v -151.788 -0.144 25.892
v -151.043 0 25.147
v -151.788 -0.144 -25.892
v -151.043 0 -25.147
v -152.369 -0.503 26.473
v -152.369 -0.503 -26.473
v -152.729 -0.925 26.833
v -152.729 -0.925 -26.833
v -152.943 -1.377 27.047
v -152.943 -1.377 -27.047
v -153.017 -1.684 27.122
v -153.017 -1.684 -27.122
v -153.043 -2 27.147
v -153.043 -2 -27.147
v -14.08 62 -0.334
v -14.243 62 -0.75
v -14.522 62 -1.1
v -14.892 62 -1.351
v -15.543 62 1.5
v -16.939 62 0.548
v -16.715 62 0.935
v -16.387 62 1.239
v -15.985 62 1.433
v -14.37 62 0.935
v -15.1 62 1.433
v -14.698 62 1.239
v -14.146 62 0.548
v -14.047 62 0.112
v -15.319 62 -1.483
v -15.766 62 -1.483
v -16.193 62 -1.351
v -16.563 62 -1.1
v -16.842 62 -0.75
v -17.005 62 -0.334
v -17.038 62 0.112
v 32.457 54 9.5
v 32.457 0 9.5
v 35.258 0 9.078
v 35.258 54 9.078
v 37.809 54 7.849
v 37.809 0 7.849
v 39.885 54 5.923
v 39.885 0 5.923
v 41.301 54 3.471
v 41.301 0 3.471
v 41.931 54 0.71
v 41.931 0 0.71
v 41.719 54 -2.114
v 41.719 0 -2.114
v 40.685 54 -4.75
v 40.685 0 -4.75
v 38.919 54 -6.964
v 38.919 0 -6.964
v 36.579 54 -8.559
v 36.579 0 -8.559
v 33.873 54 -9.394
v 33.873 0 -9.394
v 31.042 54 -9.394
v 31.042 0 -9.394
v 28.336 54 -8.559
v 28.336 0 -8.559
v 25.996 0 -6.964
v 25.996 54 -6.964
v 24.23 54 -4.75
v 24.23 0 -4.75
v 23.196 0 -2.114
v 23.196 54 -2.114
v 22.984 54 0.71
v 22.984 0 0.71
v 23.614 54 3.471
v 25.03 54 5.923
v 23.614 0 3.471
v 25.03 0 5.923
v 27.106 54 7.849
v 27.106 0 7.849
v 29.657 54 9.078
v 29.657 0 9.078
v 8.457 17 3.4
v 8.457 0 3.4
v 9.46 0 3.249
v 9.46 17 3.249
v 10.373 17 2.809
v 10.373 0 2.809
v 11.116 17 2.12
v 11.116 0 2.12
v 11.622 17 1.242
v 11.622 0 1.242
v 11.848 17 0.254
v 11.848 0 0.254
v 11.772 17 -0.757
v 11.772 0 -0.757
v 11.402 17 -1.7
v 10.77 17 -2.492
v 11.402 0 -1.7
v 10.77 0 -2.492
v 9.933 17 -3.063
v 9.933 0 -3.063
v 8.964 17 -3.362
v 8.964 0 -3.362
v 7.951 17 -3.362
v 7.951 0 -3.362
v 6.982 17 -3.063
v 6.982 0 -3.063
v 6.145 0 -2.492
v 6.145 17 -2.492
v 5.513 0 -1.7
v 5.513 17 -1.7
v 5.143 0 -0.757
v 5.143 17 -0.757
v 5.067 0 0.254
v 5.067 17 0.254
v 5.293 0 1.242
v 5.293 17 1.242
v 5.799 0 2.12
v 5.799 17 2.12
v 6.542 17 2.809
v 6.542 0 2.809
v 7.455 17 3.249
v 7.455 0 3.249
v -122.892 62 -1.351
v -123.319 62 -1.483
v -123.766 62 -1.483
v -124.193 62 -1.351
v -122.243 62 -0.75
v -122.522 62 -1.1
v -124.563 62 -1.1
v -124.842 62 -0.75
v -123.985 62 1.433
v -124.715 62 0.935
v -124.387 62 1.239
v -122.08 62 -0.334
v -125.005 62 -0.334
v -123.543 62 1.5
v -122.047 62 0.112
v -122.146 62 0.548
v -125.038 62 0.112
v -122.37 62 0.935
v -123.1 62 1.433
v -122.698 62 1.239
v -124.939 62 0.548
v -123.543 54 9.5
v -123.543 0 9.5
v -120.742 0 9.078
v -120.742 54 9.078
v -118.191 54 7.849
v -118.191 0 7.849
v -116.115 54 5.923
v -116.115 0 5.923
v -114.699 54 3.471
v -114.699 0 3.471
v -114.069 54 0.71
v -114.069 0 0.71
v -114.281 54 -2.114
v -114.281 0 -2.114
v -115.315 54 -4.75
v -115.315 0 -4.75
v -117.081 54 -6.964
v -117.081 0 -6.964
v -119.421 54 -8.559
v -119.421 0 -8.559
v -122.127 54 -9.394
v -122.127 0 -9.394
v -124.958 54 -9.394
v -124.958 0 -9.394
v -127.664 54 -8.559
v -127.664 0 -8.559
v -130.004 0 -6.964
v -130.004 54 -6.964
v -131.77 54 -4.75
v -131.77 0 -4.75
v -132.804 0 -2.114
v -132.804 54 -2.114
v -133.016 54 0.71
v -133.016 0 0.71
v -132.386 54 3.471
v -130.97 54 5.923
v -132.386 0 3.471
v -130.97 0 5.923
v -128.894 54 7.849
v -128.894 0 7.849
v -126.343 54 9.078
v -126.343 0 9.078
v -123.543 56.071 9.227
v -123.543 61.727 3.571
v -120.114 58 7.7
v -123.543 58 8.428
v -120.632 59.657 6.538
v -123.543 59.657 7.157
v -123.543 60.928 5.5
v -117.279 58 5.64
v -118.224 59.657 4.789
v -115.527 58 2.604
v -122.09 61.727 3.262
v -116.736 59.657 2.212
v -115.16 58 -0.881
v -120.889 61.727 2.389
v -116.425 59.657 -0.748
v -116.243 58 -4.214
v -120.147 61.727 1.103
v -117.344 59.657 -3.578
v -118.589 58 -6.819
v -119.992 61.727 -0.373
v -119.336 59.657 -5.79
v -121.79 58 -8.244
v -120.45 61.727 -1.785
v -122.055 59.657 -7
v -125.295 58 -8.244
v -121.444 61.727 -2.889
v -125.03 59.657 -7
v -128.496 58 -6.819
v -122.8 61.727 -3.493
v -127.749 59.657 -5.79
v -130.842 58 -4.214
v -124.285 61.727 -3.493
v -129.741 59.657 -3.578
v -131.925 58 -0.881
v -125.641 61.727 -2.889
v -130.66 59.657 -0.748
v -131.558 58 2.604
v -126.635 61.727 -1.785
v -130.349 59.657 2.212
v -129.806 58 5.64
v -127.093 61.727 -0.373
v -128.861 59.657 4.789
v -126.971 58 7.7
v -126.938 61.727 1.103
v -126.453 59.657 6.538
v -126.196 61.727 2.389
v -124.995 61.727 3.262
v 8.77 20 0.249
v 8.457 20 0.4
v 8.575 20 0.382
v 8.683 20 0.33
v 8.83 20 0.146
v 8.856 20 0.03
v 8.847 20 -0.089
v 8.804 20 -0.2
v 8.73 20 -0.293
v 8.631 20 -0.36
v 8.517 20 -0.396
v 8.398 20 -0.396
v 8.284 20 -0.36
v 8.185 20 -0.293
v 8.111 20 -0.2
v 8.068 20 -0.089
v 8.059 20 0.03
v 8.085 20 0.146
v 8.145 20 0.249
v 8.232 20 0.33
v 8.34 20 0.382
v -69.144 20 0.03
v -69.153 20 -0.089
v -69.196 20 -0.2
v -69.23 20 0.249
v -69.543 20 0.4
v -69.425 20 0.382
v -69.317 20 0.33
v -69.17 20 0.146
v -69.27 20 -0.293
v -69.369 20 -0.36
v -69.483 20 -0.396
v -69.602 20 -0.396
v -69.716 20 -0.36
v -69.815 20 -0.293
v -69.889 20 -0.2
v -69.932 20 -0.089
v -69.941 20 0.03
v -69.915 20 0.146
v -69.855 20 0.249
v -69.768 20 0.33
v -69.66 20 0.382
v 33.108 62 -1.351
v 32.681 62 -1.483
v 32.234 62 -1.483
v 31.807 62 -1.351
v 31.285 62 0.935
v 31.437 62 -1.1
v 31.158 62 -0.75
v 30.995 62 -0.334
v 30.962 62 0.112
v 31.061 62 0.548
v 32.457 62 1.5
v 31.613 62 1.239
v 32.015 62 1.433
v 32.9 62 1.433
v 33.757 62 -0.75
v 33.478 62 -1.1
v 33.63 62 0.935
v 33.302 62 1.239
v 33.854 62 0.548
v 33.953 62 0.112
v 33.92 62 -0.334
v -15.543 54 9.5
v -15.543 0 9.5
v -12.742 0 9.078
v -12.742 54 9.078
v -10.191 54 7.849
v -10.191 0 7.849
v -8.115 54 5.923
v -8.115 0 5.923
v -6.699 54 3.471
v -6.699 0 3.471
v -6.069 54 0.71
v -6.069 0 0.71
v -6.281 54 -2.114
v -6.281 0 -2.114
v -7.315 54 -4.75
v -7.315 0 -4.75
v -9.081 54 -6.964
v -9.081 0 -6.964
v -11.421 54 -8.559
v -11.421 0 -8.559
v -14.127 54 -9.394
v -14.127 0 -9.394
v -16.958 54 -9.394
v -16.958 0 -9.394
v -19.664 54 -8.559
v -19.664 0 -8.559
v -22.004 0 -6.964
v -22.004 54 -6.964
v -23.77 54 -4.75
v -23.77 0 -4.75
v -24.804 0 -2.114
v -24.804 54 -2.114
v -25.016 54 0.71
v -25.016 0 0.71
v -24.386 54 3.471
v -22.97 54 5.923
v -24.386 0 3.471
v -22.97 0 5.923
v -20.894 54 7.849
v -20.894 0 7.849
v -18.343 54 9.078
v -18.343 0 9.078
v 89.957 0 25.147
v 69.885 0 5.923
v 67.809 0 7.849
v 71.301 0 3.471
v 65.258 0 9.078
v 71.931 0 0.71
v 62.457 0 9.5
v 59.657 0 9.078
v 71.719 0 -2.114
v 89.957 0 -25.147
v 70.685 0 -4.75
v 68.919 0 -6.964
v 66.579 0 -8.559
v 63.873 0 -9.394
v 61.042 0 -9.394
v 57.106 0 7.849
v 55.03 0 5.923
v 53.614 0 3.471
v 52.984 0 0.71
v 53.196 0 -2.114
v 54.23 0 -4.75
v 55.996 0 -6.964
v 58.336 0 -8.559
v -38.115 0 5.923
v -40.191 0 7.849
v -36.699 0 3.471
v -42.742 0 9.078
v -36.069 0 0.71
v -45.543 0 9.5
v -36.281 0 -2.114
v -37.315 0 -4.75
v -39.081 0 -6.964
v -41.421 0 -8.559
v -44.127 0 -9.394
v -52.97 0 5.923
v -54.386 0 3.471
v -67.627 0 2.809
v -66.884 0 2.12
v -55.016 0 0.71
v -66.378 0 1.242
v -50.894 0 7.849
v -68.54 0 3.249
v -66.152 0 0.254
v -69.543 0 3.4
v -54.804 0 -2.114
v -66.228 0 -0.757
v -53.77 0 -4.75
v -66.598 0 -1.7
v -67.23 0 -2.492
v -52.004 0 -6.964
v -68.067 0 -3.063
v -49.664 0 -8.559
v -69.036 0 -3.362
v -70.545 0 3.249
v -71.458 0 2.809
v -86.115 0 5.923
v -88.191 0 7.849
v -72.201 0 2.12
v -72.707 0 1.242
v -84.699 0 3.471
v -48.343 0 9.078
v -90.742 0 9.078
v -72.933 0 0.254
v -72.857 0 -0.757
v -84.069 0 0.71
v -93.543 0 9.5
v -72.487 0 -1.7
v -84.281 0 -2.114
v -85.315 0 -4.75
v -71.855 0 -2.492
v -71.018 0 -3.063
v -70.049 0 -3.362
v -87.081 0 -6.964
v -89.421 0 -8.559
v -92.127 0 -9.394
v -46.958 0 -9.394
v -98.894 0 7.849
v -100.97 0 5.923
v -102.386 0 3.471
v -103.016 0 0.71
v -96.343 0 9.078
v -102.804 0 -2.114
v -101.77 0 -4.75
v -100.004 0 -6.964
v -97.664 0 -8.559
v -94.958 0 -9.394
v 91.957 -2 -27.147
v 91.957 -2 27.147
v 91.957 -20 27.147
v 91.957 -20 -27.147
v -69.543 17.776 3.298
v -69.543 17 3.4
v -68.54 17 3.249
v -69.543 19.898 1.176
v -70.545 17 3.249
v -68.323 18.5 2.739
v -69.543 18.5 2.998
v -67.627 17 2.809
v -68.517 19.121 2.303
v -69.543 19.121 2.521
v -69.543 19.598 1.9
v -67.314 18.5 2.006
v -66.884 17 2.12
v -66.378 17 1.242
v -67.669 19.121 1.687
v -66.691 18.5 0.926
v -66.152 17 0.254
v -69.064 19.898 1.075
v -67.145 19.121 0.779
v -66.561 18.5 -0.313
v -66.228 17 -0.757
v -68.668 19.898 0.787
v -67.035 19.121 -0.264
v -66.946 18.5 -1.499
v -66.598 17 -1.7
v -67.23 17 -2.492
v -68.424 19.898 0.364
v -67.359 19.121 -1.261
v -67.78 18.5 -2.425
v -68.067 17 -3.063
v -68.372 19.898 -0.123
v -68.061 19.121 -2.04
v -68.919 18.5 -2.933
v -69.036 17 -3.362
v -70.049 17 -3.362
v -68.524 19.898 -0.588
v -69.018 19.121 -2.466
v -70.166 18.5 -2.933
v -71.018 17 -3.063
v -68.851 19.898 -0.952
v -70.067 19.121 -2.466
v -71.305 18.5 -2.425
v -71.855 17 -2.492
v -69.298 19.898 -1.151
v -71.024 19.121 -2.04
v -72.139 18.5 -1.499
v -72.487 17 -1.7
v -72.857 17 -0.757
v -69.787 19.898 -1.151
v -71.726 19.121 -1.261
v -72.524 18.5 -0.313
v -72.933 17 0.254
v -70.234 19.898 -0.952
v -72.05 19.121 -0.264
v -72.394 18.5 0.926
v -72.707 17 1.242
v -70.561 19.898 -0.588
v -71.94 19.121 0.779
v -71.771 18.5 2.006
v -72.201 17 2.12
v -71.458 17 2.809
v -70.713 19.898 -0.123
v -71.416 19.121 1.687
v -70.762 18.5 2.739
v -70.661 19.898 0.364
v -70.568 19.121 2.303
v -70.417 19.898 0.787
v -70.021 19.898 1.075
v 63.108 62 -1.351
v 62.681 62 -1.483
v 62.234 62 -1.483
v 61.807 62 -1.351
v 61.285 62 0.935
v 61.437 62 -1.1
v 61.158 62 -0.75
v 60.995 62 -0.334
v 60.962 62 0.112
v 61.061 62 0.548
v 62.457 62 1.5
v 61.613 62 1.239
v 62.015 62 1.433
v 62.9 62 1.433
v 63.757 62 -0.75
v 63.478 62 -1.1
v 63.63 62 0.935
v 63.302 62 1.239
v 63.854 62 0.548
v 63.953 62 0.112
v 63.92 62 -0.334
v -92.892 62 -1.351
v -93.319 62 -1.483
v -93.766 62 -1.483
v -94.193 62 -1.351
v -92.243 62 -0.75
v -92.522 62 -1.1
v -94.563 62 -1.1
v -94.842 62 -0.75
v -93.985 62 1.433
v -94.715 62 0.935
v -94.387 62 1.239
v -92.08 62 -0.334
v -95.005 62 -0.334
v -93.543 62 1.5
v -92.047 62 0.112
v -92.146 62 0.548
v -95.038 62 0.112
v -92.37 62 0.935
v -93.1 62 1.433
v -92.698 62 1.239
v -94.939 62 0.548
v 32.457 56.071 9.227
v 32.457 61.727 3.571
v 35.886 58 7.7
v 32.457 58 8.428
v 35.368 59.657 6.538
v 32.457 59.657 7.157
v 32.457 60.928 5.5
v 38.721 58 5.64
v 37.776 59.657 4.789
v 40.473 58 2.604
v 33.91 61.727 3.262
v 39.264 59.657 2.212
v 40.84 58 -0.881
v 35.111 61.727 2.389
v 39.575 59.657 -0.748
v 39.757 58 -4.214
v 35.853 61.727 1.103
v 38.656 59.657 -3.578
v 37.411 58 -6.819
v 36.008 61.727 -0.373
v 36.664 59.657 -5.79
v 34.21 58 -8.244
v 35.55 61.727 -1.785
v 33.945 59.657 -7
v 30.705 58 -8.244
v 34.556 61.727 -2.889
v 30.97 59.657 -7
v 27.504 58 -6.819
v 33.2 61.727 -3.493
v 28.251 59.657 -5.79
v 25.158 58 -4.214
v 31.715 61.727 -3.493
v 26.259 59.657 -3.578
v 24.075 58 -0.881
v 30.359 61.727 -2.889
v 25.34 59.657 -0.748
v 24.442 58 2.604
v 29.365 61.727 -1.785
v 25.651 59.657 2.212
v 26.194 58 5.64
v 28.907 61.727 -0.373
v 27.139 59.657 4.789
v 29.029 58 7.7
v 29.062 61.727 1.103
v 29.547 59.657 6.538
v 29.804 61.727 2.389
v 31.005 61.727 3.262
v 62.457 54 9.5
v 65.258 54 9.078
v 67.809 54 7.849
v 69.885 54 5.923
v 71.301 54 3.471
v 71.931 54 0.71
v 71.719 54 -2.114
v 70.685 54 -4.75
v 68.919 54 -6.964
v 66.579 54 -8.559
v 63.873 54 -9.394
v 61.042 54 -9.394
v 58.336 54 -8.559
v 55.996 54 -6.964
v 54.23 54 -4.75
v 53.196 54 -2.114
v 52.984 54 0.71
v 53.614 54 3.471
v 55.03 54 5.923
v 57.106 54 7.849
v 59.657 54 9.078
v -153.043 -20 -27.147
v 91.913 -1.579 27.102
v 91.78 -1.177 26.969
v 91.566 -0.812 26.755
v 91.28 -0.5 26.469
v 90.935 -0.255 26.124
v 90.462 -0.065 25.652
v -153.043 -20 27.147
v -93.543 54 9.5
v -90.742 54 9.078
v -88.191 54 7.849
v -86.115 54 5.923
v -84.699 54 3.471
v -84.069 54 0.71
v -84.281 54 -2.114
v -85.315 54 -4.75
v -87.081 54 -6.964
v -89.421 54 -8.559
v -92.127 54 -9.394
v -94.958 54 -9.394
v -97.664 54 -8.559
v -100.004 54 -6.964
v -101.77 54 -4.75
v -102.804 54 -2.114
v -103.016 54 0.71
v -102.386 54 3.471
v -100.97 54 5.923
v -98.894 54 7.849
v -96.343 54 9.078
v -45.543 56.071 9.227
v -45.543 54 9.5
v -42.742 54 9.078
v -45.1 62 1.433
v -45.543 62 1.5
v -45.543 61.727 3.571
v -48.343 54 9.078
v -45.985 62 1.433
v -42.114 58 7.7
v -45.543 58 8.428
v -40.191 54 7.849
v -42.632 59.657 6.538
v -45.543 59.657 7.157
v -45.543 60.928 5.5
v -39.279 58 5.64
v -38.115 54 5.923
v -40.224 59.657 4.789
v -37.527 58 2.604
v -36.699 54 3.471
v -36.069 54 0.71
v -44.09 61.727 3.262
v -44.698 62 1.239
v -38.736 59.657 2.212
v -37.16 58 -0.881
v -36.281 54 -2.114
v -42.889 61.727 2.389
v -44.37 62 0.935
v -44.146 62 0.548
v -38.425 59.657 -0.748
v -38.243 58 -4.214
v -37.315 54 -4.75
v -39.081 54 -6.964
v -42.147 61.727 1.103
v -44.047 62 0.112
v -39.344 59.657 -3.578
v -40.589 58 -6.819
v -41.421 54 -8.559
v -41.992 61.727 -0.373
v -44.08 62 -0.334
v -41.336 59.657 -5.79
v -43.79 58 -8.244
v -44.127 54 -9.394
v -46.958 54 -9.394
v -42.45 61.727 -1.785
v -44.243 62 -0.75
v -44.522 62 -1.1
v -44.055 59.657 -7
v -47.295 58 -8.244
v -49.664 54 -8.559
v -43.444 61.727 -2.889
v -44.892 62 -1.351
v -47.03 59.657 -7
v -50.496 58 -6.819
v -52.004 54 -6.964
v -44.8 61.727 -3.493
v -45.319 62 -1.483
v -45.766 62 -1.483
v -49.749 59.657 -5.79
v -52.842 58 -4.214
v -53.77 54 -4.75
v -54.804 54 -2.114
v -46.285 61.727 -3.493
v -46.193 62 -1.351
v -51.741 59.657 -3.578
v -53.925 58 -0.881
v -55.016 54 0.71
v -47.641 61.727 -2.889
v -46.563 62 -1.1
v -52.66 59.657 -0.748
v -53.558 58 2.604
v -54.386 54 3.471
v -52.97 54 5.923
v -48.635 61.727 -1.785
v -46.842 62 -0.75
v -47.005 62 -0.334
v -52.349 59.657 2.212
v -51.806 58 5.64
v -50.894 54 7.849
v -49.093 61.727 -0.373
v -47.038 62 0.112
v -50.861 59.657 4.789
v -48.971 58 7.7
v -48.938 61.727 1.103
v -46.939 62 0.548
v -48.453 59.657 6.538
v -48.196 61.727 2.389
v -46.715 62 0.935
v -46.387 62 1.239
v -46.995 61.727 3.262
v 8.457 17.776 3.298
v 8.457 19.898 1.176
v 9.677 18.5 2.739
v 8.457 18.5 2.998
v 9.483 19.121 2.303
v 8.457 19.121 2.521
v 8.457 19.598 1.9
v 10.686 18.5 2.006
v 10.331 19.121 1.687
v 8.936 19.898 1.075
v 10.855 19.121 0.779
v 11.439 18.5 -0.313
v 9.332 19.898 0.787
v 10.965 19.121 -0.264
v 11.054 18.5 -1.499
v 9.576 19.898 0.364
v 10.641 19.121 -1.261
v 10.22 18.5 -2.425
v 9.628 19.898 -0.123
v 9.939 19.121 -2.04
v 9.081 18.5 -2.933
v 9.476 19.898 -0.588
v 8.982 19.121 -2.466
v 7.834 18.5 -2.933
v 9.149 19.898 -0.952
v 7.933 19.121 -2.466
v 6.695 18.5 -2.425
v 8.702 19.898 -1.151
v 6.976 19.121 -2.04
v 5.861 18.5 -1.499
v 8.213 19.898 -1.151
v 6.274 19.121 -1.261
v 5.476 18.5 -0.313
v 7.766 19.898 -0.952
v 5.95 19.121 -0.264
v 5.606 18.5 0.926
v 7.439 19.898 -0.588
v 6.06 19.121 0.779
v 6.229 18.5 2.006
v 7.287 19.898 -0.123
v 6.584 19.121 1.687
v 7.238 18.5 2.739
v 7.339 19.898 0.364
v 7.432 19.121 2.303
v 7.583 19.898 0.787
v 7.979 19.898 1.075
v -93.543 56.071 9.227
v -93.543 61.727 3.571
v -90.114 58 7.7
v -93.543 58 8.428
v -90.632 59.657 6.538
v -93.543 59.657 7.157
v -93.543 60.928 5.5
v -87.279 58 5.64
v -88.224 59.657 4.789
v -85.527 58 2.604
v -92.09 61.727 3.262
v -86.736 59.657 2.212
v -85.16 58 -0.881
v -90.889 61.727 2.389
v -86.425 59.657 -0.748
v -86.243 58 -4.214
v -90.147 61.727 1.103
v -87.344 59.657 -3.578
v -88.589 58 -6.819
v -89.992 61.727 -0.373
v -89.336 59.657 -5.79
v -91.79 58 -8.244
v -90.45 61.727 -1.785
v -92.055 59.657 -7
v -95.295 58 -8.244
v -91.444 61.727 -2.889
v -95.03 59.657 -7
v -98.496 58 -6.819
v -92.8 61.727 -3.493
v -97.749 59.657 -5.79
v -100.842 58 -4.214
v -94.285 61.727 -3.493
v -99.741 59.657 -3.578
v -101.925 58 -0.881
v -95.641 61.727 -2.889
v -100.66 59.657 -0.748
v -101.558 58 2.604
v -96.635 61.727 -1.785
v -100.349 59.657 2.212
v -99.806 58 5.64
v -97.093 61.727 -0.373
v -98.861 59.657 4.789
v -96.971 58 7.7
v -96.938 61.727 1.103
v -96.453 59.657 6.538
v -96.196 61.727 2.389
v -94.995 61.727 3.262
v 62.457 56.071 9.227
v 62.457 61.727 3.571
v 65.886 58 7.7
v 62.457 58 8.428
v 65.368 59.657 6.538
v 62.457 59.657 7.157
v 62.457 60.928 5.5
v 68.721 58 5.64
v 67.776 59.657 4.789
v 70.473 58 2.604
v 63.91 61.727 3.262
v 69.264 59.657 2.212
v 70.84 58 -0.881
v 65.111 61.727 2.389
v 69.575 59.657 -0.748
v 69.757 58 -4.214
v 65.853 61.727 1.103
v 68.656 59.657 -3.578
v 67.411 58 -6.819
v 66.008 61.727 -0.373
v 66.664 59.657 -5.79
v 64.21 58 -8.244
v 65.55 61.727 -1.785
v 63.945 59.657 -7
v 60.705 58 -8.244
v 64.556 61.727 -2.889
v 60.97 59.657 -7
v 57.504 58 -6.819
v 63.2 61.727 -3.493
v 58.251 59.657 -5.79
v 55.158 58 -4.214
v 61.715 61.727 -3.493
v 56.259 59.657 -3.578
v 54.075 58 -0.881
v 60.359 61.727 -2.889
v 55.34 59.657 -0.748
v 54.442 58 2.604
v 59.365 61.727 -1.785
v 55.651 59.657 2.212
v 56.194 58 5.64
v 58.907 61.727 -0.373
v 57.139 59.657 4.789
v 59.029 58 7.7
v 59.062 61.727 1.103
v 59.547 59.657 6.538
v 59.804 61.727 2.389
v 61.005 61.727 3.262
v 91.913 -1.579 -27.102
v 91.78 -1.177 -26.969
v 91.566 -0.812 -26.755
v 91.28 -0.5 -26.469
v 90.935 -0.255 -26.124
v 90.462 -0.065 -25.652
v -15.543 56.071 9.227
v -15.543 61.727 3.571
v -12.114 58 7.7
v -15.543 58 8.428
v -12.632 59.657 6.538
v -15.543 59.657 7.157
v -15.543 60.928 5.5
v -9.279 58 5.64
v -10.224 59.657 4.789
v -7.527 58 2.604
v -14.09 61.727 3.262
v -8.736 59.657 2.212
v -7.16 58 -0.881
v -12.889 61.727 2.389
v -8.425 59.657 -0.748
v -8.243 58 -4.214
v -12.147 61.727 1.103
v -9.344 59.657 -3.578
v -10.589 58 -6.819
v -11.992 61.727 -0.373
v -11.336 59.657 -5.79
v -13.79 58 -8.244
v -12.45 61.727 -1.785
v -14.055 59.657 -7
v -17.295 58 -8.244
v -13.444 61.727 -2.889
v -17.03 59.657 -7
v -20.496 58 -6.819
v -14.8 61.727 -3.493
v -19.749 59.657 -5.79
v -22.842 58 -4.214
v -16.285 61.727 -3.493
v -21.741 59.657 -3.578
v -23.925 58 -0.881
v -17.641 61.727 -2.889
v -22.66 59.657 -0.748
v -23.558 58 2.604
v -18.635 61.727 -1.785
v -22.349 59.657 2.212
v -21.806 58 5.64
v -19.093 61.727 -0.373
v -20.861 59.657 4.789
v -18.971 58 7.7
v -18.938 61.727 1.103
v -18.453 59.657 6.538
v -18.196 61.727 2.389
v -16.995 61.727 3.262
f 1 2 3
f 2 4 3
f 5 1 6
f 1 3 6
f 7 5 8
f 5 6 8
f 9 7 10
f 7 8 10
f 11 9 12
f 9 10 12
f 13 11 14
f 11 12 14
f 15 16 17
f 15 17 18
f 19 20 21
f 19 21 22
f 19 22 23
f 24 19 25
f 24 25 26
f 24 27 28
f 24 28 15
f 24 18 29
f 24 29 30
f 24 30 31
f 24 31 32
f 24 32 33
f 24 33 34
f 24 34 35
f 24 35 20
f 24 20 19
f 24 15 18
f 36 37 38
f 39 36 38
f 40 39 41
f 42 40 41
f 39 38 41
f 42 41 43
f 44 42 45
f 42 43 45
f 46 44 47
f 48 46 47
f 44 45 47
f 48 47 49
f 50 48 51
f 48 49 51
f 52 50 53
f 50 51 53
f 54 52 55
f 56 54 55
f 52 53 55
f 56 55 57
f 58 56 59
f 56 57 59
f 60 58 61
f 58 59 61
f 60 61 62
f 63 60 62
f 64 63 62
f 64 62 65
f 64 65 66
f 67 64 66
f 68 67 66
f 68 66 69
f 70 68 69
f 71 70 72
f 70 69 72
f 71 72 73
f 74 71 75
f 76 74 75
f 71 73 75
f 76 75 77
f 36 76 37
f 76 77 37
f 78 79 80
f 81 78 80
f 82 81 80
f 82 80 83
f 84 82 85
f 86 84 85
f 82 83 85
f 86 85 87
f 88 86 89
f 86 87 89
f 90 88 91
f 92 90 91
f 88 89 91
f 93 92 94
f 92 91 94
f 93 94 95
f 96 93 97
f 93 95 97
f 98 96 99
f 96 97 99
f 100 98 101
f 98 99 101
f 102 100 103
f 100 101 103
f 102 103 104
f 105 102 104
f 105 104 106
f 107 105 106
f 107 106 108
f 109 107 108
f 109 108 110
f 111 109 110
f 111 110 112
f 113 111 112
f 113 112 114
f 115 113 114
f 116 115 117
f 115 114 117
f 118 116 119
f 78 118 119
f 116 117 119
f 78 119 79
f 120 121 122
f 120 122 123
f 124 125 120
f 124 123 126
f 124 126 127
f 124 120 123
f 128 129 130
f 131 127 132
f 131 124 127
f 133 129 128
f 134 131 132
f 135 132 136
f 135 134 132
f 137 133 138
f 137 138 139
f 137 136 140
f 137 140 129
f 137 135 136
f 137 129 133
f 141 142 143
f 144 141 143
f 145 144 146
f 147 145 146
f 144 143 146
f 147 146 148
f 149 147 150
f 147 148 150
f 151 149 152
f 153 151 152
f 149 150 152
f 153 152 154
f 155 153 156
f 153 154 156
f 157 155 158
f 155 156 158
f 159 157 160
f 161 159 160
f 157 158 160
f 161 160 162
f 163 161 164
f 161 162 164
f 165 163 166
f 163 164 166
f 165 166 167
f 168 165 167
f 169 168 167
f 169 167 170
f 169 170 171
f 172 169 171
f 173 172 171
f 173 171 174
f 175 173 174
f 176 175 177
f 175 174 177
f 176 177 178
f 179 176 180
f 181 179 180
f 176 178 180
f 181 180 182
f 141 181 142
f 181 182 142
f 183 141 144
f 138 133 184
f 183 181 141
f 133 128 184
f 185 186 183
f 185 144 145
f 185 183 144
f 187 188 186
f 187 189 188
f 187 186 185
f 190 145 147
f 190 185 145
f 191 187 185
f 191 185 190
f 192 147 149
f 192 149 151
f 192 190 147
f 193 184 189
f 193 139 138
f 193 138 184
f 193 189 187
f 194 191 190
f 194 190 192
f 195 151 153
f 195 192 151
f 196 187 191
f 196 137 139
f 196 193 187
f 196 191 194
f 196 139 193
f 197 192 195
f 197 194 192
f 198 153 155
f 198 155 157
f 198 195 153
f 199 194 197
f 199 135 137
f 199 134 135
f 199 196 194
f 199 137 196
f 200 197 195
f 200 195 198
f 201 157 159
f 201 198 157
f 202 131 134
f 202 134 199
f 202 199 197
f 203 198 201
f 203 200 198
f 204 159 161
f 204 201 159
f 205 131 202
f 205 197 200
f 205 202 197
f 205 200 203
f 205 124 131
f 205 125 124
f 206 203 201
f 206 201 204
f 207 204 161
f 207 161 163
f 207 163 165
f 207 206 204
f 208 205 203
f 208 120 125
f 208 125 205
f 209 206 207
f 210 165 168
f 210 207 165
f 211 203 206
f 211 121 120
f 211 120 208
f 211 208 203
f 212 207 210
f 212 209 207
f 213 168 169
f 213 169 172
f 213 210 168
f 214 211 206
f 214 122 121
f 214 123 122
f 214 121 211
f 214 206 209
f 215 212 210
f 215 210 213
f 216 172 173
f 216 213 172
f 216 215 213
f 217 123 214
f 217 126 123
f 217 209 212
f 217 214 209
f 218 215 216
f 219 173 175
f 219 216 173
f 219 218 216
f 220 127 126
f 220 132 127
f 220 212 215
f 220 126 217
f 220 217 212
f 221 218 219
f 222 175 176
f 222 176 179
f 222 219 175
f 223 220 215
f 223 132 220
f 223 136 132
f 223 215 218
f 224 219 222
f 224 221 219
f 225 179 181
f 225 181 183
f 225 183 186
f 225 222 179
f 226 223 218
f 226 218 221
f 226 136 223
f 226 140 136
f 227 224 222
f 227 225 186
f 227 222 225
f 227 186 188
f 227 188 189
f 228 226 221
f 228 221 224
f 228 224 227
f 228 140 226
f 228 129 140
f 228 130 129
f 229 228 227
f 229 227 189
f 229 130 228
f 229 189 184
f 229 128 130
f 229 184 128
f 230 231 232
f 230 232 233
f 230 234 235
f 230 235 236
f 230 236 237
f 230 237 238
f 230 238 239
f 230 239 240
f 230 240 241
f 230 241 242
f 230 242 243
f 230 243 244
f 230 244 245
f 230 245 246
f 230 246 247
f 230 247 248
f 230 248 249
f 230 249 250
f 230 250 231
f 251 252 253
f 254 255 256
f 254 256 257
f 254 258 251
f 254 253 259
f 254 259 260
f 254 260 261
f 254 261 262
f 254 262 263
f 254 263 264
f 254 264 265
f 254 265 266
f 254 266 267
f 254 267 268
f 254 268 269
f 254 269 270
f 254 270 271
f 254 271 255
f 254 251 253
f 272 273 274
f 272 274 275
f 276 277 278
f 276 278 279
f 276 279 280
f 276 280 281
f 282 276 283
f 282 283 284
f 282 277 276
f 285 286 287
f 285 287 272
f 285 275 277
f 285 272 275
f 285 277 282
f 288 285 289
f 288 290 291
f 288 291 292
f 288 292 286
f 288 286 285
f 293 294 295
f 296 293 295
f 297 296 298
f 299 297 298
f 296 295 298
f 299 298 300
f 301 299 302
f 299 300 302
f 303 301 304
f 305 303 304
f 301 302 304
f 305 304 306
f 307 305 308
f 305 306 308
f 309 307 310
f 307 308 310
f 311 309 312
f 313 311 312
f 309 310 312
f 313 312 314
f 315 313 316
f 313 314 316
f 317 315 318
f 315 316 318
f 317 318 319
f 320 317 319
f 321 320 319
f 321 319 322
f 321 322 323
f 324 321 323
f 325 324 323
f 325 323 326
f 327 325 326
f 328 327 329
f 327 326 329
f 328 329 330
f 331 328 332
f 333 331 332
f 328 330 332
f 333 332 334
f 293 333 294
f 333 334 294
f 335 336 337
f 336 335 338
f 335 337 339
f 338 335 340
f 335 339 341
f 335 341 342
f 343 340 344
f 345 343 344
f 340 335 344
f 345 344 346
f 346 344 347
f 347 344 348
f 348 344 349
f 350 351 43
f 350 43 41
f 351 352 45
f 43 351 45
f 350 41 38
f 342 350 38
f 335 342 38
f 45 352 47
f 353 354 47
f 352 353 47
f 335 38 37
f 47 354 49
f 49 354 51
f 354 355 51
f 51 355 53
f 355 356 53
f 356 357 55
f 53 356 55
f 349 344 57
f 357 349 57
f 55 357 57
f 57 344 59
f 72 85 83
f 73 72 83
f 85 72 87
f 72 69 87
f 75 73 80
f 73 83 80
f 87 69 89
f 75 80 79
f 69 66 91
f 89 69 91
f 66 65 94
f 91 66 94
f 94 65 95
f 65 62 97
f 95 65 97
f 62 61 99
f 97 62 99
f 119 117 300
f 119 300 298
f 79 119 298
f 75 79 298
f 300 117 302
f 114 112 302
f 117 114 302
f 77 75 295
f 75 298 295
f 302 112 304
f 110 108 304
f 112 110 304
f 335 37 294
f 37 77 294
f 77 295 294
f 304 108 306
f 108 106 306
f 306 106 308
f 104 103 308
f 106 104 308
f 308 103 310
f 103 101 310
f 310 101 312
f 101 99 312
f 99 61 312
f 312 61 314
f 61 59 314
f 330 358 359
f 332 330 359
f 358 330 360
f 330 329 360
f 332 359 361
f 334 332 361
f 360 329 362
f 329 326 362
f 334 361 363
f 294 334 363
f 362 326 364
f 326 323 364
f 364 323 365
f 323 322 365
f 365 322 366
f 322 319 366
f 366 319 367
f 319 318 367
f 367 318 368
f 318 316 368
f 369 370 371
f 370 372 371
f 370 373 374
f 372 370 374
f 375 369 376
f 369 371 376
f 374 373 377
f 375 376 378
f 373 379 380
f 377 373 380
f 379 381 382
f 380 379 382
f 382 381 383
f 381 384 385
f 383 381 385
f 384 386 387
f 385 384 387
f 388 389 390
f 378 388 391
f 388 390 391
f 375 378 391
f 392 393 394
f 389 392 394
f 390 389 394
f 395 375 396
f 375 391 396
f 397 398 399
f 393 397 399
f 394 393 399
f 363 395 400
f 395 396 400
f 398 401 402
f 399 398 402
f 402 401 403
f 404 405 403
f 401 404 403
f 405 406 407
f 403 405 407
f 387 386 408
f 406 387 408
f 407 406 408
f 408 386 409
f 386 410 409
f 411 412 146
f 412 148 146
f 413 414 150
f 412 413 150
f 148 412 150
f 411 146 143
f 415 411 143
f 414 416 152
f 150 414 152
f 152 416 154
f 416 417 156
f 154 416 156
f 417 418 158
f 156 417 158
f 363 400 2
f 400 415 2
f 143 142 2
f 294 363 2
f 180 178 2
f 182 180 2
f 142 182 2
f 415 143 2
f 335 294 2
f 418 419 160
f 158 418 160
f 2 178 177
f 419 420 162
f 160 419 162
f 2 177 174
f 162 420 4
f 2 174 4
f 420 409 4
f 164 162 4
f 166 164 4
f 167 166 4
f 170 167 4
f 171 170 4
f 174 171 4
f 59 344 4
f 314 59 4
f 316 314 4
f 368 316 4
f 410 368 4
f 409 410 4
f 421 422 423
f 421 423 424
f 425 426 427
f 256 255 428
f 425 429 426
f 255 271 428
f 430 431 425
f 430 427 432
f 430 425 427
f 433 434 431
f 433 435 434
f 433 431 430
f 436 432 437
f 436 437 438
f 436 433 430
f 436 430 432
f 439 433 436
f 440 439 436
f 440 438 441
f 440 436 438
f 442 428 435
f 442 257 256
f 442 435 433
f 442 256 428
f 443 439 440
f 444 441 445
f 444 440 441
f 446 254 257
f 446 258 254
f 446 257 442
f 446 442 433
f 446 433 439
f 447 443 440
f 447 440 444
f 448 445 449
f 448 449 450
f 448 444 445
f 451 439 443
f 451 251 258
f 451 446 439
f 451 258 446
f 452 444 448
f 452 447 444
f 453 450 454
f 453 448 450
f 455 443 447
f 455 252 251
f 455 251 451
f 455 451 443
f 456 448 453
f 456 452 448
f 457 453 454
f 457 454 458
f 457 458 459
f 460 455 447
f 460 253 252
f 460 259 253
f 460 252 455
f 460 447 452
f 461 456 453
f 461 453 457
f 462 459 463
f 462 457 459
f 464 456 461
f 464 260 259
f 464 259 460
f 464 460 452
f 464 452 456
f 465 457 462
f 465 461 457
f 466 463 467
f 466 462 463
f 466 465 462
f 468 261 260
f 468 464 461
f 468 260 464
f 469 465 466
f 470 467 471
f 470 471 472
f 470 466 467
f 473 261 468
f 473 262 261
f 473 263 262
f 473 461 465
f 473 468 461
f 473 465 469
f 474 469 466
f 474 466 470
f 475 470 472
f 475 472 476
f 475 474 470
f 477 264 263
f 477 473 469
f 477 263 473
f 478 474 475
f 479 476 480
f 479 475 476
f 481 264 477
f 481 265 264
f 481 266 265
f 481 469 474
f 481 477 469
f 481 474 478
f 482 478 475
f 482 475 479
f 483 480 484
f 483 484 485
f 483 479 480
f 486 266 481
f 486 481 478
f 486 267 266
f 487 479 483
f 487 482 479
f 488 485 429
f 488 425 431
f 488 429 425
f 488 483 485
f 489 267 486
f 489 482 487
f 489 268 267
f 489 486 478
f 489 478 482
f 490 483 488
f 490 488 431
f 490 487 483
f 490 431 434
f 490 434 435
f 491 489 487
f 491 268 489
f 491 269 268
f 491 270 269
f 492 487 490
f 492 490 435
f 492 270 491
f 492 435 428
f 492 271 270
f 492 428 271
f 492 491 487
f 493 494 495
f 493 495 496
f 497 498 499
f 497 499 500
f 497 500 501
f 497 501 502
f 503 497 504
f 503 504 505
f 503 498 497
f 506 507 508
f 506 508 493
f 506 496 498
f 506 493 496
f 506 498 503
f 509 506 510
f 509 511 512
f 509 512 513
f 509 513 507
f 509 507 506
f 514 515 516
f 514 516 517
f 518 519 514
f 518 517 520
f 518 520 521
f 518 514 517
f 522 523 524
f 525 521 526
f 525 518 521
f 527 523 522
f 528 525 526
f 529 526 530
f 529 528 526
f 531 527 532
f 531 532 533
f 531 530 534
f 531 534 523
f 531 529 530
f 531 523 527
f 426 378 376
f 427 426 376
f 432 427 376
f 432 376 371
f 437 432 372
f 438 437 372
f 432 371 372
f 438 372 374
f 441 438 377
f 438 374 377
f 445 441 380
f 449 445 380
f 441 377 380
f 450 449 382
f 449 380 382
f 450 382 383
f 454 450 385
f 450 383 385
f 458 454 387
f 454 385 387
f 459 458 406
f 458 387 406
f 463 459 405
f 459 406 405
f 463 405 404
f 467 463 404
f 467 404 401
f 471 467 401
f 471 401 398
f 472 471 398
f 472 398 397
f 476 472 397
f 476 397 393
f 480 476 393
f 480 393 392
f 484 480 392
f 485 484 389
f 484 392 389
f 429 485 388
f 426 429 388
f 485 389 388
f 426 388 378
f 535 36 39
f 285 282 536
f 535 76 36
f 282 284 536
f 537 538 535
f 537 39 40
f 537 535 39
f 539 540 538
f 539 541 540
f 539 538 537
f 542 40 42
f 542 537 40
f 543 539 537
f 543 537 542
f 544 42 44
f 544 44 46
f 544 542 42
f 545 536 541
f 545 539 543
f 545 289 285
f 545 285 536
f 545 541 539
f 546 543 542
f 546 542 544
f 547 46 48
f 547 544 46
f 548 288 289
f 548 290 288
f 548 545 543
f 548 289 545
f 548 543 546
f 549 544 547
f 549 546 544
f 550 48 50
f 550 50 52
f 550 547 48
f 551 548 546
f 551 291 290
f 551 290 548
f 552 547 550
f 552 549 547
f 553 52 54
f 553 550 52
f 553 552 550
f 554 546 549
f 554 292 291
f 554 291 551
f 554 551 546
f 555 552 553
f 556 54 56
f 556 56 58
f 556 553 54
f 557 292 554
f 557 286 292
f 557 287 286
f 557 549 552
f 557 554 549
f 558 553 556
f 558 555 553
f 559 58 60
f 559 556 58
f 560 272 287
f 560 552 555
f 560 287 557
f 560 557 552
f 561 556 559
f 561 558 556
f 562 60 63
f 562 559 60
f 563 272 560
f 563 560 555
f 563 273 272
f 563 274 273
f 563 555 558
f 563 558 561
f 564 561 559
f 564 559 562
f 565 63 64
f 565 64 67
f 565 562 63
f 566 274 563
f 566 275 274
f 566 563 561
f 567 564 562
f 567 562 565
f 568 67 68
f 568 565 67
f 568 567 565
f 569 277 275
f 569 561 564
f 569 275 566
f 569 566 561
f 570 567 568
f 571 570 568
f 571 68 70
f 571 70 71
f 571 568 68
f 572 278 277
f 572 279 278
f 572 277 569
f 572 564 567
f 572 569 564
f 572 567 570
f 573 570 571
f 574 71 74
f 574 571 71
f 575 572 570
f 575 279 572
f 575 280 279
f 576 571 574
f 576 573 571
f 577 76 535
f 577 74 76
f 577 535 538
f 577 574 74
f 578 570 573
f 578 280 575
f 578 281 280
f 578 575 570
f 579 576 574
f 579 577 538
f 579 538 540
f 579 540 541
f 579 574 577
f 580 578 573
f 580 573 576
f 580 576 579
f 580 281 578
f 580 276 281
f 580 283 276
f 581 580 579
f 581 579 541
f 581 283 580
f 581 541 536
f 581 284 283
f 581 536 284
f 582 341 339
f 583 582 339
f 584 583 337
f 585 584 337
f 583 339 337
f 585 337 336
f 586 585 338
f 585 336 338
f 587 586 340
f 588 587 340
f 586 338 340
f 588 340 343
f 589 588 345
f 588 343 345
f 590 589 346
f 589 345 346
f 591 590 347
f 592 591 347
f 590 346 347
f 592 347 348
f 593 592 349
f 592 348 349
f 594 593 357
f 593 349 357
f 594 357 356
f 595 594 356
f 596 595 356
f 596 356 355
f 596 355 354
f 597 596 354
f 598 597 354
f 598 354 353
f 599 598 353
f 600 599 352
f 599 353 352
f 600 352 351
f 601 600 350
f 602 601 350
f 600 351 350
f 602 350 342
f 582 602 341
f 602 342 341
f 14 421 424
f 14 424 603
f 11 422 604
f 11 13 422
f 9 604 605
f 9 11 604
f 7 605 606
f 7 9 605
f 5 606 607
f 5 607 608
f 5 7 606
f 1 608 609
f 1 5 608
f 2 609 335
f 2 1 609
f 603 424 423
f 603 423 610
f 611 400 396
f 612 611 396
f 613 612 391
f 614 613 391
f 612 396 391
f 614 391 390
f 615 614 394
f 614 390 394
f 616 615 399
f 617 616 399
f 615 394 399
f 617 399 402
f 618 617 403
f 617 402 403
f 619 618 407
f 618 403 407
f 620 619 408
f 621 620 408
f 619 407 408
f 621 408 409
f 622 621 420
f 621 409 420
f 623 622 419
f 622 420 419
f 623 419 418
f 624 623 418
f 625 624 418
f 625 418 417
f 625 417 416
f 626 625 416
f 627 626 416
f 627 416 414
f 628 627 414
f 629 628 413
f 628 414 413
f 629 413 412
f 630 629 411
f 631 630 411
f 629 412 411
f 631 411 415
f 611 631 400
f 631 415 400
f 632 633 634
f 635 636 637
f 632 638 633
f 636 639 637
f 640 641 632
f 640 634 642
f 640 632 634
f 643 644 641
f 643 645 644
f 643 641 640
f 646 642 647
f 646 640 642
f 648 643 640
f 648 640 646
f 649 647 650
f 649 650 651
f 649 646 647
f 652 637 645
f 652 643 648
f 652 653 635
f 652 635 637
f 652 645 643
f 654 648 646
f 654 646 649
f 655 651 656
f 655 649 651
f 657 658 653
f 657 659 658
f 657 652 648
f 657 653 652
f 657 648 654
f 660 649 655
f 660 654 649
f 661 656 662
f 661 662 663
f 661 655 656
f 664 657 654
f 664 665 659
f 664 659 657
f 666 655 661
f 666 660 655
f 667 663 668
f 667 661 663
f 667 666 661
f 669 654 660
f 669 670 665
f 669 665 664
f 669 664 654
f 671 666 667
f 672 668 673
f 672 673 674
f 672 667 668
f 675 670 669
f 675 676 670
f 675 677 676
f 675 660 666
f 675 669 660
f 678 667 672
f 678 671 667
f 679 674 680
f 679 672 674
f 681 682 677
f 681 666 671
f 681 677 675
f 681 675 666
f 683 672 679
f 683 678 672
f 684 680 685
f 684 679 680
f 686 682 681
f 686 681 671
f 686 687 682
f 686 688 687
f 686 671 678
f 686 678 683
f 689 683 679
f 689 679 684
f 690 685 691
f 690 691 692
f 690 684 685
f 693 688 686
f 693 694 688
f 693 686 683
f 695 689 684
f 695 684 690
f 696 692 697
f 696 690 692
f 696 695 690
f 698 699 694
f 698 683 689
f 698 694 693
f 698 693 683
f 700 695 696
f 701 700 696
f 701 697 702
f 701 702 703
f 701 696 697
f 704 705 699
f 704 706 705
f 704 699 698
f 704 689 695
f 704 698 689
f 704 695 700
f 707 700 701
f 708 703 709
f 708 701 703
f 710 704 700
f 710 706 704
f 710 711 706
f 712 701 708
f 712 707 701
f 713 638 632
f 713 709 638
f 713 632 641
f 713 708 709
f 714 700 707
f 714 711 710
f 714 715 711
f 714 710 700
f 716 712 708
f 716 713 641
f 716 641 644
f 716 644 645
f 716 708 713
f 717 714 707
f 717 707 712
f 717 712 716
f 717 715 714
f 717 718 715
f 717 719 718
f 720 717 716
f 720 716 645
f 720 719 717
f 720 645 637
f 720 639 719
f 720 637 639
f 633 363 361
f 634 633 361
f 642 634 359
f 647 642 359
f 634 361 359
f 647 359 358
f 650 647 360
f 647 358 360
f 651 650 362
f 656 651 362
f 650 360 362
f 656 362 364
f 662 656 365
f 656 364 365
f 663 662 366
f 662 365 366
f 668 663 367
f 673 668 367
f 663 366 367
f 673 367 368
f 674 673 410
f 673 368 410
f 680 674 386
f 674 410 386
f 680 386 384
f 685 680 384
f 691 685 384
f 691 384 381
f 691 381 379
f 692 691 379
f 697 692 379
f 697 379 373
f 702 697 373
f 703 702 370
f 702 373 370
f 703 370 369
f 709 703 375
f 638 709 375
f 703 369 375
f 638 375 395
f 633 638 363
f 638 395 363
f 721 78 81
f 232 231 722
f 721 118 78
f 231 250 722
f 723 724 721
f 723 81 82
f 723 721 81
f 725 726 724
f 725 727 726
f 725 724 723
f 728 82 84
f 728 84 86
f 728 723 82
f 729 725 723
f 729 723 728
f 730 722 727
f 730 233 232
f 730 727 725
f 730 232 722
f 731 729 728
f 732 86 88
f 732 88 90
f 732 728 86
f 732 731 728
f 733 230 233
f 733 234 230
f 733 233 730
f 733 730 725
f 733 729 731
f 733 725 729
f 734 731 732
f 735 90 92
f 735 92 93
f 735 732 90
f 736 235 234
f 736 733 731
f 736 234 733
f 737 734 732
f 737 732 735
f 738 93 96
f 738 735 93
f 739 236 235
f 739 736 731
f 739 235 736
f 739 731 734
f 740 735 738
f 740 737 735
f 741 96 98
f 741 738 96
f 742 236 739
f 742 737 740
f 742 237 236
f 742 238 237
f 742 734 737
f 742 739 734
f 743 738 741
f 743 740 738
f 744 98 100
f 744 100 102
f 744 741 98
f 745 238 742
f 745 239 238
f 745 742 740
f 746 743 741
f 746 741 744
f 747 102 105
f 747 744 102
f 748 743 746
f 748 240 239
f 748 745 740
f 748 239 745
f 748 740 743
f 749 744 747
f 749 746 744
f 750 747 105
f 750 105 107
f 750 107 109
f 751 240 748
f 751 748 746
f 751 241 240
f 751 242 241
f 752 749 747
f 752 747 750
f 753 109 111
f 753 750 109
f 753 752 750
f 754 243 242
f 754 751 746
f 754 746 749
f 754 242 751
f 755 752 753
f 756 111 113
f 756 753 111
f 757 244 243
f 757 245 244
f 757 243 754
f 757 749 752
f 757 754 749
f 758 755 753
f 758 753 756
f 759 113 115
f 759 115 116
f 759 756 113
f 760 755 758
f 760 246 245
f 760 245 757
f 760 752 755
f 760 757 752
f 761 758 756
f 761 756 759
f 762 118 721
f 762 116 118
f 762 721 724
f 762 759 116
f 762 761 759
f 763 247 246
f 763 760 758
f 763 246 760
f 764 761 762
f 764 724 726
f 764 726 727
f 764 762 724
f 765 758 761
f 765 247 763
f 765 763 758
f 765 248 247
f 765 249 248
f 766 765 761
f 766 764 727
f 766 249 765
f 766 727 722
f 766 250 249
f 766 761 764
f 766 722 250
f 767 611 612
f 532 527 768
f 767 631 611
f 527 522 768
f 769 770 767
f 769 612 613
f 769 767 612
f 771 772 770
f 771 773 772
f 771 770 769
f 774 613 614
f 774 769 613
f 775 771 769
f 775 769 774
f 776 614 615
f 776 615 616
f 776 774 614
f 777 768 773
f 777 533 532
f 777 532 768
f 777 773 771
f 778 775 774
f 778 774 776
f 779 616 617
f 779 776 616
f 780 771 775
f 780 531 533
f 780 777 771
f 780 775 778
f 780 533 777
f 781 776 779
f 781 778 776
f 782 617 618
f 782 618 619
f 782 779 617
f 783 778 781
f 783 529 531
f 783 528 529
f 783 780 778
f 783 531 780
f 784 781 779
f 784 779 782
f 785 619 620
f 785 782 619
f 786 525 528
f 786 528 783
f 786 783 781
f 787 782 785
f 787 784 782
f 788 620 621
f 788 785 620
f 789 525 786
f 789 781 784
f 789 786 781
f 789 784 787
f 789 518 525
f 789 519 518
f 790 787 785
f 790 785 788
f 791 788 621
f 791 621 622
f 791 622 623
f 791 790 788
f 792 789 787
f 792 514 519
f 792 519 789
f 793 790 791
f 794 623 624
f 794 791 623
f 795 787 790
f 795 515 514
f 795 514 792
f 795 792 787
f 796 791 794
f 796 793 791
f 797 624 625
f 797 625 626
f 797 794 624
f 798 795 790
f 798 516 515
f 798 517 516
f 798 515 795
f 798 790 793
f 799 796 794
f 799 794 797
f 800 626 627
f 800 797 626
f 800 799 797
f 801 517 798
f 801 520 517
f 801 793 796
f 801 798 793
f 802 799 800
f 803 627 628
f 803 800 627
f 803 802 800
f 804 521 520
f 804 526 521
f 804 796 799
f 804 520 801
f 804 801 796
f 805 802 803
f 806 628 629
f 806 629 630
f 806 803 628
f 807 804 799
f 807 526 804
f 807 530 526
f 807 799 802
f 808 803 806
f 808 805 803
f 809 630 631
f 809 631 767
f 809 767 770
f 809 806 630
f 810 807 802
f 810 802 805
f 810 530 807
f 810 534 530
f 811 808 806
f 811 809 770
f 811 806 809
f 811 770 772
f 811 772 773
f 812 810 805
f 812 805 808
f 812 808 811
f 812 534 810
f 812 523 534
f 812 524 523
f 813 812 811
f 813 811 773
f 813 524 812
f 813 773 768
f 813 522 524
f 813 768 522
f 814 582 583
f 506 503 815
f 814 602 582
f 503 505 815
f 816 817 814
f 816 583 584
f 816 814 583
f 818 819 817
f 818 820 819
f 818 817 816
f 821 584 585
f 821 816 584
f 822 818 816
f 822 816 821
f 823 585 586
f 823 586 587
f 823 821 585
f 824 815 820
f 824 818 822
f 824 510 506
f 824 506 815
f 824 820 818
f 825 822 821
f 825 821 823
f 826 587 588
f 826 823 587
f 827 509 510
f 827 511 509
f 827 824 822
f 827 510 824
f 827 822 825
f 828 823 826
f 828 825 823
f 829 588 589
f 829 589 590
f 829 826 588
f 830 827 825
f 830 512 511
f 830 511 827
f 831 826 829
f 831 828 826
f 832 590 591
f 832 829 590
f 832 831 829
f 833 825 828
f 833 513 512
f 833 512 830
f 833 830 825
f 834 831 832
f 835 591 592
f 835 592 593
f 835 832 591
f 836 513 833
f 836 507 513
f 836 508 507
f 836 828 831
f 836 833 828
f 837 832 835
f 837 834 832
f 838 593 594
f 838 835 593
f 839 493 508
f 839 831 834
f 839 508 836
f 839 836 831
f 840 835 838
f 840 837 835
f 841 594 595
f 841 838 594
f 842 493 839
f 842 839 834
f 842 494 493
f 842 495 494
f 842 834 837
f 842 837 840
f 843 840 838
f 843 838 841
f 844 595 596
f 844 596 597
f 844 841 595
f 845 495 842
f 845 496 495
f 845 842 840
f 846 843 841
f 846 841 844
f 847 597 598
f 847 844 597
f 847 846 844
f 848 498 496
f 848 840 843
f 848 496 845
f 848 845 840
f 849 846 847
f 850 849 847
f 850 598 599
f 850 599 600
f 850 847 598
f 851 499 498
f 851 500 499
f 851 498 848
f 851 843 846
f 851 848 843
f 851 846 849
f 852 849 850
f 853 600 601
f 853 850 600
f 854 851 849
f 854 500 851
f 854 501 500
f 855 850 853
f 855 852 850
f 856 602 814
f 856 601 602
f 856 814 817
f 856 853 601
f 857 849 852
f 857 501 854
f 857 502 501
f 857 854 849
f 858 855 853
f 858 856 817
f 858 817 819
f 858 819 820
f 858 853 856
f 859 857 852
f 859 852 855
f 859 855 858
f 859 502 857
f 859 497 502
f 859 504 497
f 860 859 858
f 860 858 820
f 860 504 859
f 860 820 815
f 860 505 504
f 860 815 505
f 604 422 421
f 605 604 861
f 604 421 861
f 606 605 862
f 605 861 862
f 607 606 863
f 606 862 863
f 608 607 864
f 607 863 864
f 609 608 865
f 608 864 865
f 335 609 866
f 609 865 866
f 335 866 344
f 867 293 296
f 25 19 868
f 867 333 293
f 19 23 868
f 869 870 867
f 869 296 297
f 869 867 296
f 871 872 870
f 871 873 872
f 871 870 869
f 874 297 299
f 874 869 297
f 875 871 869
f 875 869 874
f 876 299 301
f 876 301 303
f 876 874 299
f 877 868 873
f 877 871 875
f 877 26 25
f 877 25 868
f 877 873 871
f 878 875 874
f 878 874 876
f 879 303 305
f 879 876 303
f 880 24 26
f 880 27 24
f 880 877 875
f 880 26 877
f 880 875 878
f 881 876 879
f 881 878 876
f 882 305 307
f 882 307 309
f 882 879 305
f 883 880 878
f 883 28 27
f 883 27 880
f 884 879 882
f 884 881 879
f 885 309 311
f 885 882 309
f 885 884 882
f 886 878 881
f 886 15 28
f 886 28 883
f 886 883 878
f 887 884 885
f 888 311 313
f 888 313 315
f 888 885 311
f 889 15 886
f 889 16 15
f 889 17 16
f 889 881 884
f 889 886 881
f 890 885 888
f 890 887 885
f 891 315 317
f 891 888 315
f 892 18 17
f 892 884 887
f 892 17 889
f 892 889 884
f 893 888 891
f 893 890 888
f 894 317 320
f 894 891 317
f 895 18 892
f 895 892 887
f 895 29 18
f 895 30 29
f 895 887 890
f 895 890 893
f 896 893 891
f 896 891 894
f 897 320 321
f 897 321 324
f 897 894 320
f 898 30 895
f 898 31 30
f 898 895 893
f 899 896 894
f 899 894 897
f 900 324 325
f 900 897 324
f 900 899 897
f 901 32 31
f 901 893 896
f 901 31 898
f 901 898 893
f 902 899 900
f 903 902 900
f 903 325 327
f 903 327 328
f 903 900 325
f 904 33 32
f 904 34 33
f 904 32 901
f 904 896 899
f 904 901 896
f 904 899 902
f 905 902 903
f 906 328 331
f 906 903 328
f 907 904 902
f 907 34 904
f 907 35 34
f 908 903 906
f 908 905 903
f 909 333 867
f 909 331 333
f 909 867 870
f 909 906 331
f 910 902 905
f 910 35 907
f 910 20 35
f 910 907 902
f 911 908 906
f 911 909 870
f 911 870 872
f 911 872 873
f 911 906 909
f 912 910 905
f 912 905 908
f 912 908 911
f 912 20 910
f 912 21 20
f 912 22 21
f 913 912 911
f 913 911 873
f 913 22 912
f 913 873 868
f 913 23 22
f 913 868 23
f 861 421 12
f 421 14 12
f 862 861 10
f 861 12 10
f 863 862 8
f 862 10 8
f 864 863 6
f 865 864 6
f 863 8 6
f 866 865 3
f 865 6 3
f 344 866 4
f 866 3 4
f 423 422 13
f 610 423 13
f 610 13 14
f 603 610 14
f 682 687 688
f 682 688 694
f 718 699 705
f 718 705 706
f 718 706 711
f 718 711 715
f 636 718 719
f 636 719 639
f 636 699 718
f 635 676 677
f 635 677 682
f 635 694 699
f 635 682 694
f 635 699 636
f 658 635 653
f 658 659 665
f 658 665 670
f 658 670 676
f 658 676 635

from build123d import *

# Parameters (mm, degrees)
ESQUISSE2_R          = 9.5
BOSS_EXTRU_1_DEPTH   = 62
BOSS_EXTRU_1_2_DEPTH = 62
BOSS_EXTRU_1_3_DEPTH = 62
BOSS_EXTRU_1_4_DEPTH = 62
BOSS_EXTRU_1_5_DEPTH = 62
BOSS_EXTRU_1_6_DEPTH = 62
ESQUISSE2_4_R        = 9.5
ESQUISSE2_4_R_2      = 3.4
BOSS_EXTRU_2_DEPTH   = 20
CONG_3_R             = 8
CONG_4_R             = 8
CONG_5_R             = 8
CONG_6_R             = 8
CONG_7_R             = 8
CONG_8_R             = 8
CONG_10_R            = 3
CONG_11_R            = 3
ESQUISSE4_W          = 245
ESQUISSE4_H          = 54.293120758
BOSS_EXTRU_3_DEPTH   = 20
CONG_12_R            = 2


with BuildPart() as part:
    # Esquisse2 → Boss.-Extru.1 (new body)
    with BuildSketch(Plane(origin=(0, 0, 0), x_dir=(1, 0, 0), z_dir=(0, 1, 0))):
        with Locations((32.457497884, 0)):
            Circle(ESQUISSE2_R)
    extrude(amount=BOSS_EXTRU_1_DEPTH)



with BuildPart() as body_2:
    # Esquisse2 → Boss.-Extru.1 2 (new body)
    with BuildSketch(Plane(origin=(0, 0, 0), x_dir=(1, 0, 0), z_dir=(0, 1, 0))):
        with Locations((62.457497884, 0)):
            Circle(ESQUISSE2_R)
    extrude(amount=BOSS_EXTRU_1_2_DEPTH)


with BuildPart() as body_3:
    # Esquisse2 → Boss.-Extru.1 3 (new body)
    with BuildSketch(Plane(origin=(0, 0, 0), x_dir=(1, 0, 0), z_dir=(0, 1, 0))):
        with Locations((-123.542502116, 0)):
            Circle(ESQUISSE2_R)
    extrude(amount=BOSS_EXTRU_1_3_DEPTH)


with BuildPart() as body_4:
    # Esquisse2 → Boss.-Extru.1 4 (new body)
    with BuildSketch(Plane(origin=(0, 0, 0), x_dir=(1, 0, 0), z_dir=(0, 1, 0))):
        with Locations((-93.542502116, 0)):
            Circle(ESQUISSE2_R)
    extrude(amount=BOSS_EXTRU_1_4_DEPTH)


with BuildPart() as body_5:
    # Esquisse2 → Boss.-Extru.1 5 (new body)
    with BuildSketch(Plane(origin=(0, 0, 0), x_dir=(1, 0, 0), z_dir=(0, 1, 0))):
        with Locations((-45.542502116, 0)):
            Circle(ESQUISSE2_R)
    extrude(amount=BOSS_EXTRU_1_5_DEPTH)


with BuildPart() as body_6:
    # Esquisse2 → Boss.-Extru.1 6 (new body)
    with BuildSketch(Plane(origin=(0, 0, 0), x_dir=(1, 0, 0), z_dir=(0, 1, 0))):
        with Locations((-15.542502116, 0)):
            Circle(ESQUISSE2_R)
    extrude(amount=BOSS_EXTRU_1_6_DEPTH)


with BuildPart() as part_1:
    add(part.part)

    add(body_2.part)  # Boss.-Extru.2 merges body 2

    add(body_3.part)  # Boss.-Extru.2 merges body 3

    add(body_4.part)  # Boss.-Extru.2 merges body 4

    add(body_5.part)  # Boss.-Extru.2 merges body 5

    add(body_6.part)  # Boss.-Extru.2 merges body 6
    # Esquisse2<4> → Boss.-Extru.2 (add)
    with BuildSketch(Plane(origin=(0, 0, 0), x_dir=(1, 0, 0), z_dir=(0, 1, 0))):
        with Locations((32.457497884, 0)):
            Circle(ESQUISSE2_4_R)
        with Locations((62.457497884, 0)):
            Circle(ESQUISSE2_4_R)
        with Locations((-123.542502116, 0)):
            Circle(ESQUISSE2_4_R)
        with Locations((-93.542502116, 0)):
            Circle(ESQUISSE2_4_R)
        with Locations((-45.542502116, 0)):
            Circle(ESQUISSE2_4_R)
        with Locations((-15.542502116, 0)):
            Circle(ESQUISSE2_4_R)
        with Locations((-69.542502116, 0)):
            Circle(ESQUISSE2_4_R_2)
        with Locations((8.457497884, 0)):
            Circle(ESQUISSE2_4_R_2)
    extrude(amount=BOSS_EXTRU_2_DEPTH)

    # Congé3
    cong_3_edges = [part_1.edges().sort_by_distance(p)[0] for p in [
        (-133.042502116, 62, 0),
    ]]
    fillet(cong_3_edges, radius=CONG_3_R)

    # Congé4
    cong_4_edges = [part_1.edges().sort_by_distance(p)[0] for p in [
        (-103.042502116, 62, 0),
    ]]
    fillet(cong_4_edges, radius=CONG_4_R)

    # Congé5
    cong_5_edges = [part_1.edges().sort_by_distance(p)[0] for p in [
        (-55.042502116, 62, 0),
    ]]
    fillet(cong_5_edges, radius=CONG_5_R)

    # Congé6
    cong_6_edges = [part_1.edges().sort_by_distance(p)[0] for p in [
        (-25.042502116, 62, 0),
    ]]
    fillet(cong_6_edges, radius=CONG_6_R)

    # Congé7
    cong_7_edges = [part_1.edges().sort_by_distance(p)[0] for p in [
        (22.957497884, 62, 0),
    ]]
    fillet(cong_7_edges, radius=CONG_7_R)

    # Congé8
    cong_8_edges = [part_1.edges().sort_by_distance(p)[0] for p in [
        (52.957497884, 62, 0),
    ]]
    fillet(cong_8_edges, radius=CONG_8_R)

    # Congé10
    cong_10_edges = [part_1.edges().sort_by_distance(p)[0] for p in [
        (-72.942502116, 20, 0),
    ]]
    fillet(cong_10_edges, radius=CONG_10_R)

    # Congé11
    cong_11_edges = [part_1.edges().sort_by_distance(p)[0] for p in [
        (5.057497884, 20, 0),
    ]]
    fillet(cong_11_edges, radius=CONG_11_R)

    # Esquisse4 → Boss.-Extru.3 (add)
    with BuildSketch(Plane(origin=(0, 0, 0), x_dir=(-1, 0, 0), z_dir=(0, -1, 0))):
        with Locations((30.542502116, 0)):
            Rectangle(ESQUISSE4_W, ESQUISSE4_H)
    extrude(amount=BOSS_EXTRU_3_DEPTH)

    # Congé12
    cong_12_edges = [part_1.edges().sort_by_distance(p)[0] for p in [
        (-153.042502116, 0, 0),
        (-30.542502116, 0, 27.146560379),
        (91.957497884, 0, 0),
        (-30.542502116, 0, -27.146560379),
    ]]
    fillet(cong_12_edges, radius=CONG_12_R)


solid = part_1.part
